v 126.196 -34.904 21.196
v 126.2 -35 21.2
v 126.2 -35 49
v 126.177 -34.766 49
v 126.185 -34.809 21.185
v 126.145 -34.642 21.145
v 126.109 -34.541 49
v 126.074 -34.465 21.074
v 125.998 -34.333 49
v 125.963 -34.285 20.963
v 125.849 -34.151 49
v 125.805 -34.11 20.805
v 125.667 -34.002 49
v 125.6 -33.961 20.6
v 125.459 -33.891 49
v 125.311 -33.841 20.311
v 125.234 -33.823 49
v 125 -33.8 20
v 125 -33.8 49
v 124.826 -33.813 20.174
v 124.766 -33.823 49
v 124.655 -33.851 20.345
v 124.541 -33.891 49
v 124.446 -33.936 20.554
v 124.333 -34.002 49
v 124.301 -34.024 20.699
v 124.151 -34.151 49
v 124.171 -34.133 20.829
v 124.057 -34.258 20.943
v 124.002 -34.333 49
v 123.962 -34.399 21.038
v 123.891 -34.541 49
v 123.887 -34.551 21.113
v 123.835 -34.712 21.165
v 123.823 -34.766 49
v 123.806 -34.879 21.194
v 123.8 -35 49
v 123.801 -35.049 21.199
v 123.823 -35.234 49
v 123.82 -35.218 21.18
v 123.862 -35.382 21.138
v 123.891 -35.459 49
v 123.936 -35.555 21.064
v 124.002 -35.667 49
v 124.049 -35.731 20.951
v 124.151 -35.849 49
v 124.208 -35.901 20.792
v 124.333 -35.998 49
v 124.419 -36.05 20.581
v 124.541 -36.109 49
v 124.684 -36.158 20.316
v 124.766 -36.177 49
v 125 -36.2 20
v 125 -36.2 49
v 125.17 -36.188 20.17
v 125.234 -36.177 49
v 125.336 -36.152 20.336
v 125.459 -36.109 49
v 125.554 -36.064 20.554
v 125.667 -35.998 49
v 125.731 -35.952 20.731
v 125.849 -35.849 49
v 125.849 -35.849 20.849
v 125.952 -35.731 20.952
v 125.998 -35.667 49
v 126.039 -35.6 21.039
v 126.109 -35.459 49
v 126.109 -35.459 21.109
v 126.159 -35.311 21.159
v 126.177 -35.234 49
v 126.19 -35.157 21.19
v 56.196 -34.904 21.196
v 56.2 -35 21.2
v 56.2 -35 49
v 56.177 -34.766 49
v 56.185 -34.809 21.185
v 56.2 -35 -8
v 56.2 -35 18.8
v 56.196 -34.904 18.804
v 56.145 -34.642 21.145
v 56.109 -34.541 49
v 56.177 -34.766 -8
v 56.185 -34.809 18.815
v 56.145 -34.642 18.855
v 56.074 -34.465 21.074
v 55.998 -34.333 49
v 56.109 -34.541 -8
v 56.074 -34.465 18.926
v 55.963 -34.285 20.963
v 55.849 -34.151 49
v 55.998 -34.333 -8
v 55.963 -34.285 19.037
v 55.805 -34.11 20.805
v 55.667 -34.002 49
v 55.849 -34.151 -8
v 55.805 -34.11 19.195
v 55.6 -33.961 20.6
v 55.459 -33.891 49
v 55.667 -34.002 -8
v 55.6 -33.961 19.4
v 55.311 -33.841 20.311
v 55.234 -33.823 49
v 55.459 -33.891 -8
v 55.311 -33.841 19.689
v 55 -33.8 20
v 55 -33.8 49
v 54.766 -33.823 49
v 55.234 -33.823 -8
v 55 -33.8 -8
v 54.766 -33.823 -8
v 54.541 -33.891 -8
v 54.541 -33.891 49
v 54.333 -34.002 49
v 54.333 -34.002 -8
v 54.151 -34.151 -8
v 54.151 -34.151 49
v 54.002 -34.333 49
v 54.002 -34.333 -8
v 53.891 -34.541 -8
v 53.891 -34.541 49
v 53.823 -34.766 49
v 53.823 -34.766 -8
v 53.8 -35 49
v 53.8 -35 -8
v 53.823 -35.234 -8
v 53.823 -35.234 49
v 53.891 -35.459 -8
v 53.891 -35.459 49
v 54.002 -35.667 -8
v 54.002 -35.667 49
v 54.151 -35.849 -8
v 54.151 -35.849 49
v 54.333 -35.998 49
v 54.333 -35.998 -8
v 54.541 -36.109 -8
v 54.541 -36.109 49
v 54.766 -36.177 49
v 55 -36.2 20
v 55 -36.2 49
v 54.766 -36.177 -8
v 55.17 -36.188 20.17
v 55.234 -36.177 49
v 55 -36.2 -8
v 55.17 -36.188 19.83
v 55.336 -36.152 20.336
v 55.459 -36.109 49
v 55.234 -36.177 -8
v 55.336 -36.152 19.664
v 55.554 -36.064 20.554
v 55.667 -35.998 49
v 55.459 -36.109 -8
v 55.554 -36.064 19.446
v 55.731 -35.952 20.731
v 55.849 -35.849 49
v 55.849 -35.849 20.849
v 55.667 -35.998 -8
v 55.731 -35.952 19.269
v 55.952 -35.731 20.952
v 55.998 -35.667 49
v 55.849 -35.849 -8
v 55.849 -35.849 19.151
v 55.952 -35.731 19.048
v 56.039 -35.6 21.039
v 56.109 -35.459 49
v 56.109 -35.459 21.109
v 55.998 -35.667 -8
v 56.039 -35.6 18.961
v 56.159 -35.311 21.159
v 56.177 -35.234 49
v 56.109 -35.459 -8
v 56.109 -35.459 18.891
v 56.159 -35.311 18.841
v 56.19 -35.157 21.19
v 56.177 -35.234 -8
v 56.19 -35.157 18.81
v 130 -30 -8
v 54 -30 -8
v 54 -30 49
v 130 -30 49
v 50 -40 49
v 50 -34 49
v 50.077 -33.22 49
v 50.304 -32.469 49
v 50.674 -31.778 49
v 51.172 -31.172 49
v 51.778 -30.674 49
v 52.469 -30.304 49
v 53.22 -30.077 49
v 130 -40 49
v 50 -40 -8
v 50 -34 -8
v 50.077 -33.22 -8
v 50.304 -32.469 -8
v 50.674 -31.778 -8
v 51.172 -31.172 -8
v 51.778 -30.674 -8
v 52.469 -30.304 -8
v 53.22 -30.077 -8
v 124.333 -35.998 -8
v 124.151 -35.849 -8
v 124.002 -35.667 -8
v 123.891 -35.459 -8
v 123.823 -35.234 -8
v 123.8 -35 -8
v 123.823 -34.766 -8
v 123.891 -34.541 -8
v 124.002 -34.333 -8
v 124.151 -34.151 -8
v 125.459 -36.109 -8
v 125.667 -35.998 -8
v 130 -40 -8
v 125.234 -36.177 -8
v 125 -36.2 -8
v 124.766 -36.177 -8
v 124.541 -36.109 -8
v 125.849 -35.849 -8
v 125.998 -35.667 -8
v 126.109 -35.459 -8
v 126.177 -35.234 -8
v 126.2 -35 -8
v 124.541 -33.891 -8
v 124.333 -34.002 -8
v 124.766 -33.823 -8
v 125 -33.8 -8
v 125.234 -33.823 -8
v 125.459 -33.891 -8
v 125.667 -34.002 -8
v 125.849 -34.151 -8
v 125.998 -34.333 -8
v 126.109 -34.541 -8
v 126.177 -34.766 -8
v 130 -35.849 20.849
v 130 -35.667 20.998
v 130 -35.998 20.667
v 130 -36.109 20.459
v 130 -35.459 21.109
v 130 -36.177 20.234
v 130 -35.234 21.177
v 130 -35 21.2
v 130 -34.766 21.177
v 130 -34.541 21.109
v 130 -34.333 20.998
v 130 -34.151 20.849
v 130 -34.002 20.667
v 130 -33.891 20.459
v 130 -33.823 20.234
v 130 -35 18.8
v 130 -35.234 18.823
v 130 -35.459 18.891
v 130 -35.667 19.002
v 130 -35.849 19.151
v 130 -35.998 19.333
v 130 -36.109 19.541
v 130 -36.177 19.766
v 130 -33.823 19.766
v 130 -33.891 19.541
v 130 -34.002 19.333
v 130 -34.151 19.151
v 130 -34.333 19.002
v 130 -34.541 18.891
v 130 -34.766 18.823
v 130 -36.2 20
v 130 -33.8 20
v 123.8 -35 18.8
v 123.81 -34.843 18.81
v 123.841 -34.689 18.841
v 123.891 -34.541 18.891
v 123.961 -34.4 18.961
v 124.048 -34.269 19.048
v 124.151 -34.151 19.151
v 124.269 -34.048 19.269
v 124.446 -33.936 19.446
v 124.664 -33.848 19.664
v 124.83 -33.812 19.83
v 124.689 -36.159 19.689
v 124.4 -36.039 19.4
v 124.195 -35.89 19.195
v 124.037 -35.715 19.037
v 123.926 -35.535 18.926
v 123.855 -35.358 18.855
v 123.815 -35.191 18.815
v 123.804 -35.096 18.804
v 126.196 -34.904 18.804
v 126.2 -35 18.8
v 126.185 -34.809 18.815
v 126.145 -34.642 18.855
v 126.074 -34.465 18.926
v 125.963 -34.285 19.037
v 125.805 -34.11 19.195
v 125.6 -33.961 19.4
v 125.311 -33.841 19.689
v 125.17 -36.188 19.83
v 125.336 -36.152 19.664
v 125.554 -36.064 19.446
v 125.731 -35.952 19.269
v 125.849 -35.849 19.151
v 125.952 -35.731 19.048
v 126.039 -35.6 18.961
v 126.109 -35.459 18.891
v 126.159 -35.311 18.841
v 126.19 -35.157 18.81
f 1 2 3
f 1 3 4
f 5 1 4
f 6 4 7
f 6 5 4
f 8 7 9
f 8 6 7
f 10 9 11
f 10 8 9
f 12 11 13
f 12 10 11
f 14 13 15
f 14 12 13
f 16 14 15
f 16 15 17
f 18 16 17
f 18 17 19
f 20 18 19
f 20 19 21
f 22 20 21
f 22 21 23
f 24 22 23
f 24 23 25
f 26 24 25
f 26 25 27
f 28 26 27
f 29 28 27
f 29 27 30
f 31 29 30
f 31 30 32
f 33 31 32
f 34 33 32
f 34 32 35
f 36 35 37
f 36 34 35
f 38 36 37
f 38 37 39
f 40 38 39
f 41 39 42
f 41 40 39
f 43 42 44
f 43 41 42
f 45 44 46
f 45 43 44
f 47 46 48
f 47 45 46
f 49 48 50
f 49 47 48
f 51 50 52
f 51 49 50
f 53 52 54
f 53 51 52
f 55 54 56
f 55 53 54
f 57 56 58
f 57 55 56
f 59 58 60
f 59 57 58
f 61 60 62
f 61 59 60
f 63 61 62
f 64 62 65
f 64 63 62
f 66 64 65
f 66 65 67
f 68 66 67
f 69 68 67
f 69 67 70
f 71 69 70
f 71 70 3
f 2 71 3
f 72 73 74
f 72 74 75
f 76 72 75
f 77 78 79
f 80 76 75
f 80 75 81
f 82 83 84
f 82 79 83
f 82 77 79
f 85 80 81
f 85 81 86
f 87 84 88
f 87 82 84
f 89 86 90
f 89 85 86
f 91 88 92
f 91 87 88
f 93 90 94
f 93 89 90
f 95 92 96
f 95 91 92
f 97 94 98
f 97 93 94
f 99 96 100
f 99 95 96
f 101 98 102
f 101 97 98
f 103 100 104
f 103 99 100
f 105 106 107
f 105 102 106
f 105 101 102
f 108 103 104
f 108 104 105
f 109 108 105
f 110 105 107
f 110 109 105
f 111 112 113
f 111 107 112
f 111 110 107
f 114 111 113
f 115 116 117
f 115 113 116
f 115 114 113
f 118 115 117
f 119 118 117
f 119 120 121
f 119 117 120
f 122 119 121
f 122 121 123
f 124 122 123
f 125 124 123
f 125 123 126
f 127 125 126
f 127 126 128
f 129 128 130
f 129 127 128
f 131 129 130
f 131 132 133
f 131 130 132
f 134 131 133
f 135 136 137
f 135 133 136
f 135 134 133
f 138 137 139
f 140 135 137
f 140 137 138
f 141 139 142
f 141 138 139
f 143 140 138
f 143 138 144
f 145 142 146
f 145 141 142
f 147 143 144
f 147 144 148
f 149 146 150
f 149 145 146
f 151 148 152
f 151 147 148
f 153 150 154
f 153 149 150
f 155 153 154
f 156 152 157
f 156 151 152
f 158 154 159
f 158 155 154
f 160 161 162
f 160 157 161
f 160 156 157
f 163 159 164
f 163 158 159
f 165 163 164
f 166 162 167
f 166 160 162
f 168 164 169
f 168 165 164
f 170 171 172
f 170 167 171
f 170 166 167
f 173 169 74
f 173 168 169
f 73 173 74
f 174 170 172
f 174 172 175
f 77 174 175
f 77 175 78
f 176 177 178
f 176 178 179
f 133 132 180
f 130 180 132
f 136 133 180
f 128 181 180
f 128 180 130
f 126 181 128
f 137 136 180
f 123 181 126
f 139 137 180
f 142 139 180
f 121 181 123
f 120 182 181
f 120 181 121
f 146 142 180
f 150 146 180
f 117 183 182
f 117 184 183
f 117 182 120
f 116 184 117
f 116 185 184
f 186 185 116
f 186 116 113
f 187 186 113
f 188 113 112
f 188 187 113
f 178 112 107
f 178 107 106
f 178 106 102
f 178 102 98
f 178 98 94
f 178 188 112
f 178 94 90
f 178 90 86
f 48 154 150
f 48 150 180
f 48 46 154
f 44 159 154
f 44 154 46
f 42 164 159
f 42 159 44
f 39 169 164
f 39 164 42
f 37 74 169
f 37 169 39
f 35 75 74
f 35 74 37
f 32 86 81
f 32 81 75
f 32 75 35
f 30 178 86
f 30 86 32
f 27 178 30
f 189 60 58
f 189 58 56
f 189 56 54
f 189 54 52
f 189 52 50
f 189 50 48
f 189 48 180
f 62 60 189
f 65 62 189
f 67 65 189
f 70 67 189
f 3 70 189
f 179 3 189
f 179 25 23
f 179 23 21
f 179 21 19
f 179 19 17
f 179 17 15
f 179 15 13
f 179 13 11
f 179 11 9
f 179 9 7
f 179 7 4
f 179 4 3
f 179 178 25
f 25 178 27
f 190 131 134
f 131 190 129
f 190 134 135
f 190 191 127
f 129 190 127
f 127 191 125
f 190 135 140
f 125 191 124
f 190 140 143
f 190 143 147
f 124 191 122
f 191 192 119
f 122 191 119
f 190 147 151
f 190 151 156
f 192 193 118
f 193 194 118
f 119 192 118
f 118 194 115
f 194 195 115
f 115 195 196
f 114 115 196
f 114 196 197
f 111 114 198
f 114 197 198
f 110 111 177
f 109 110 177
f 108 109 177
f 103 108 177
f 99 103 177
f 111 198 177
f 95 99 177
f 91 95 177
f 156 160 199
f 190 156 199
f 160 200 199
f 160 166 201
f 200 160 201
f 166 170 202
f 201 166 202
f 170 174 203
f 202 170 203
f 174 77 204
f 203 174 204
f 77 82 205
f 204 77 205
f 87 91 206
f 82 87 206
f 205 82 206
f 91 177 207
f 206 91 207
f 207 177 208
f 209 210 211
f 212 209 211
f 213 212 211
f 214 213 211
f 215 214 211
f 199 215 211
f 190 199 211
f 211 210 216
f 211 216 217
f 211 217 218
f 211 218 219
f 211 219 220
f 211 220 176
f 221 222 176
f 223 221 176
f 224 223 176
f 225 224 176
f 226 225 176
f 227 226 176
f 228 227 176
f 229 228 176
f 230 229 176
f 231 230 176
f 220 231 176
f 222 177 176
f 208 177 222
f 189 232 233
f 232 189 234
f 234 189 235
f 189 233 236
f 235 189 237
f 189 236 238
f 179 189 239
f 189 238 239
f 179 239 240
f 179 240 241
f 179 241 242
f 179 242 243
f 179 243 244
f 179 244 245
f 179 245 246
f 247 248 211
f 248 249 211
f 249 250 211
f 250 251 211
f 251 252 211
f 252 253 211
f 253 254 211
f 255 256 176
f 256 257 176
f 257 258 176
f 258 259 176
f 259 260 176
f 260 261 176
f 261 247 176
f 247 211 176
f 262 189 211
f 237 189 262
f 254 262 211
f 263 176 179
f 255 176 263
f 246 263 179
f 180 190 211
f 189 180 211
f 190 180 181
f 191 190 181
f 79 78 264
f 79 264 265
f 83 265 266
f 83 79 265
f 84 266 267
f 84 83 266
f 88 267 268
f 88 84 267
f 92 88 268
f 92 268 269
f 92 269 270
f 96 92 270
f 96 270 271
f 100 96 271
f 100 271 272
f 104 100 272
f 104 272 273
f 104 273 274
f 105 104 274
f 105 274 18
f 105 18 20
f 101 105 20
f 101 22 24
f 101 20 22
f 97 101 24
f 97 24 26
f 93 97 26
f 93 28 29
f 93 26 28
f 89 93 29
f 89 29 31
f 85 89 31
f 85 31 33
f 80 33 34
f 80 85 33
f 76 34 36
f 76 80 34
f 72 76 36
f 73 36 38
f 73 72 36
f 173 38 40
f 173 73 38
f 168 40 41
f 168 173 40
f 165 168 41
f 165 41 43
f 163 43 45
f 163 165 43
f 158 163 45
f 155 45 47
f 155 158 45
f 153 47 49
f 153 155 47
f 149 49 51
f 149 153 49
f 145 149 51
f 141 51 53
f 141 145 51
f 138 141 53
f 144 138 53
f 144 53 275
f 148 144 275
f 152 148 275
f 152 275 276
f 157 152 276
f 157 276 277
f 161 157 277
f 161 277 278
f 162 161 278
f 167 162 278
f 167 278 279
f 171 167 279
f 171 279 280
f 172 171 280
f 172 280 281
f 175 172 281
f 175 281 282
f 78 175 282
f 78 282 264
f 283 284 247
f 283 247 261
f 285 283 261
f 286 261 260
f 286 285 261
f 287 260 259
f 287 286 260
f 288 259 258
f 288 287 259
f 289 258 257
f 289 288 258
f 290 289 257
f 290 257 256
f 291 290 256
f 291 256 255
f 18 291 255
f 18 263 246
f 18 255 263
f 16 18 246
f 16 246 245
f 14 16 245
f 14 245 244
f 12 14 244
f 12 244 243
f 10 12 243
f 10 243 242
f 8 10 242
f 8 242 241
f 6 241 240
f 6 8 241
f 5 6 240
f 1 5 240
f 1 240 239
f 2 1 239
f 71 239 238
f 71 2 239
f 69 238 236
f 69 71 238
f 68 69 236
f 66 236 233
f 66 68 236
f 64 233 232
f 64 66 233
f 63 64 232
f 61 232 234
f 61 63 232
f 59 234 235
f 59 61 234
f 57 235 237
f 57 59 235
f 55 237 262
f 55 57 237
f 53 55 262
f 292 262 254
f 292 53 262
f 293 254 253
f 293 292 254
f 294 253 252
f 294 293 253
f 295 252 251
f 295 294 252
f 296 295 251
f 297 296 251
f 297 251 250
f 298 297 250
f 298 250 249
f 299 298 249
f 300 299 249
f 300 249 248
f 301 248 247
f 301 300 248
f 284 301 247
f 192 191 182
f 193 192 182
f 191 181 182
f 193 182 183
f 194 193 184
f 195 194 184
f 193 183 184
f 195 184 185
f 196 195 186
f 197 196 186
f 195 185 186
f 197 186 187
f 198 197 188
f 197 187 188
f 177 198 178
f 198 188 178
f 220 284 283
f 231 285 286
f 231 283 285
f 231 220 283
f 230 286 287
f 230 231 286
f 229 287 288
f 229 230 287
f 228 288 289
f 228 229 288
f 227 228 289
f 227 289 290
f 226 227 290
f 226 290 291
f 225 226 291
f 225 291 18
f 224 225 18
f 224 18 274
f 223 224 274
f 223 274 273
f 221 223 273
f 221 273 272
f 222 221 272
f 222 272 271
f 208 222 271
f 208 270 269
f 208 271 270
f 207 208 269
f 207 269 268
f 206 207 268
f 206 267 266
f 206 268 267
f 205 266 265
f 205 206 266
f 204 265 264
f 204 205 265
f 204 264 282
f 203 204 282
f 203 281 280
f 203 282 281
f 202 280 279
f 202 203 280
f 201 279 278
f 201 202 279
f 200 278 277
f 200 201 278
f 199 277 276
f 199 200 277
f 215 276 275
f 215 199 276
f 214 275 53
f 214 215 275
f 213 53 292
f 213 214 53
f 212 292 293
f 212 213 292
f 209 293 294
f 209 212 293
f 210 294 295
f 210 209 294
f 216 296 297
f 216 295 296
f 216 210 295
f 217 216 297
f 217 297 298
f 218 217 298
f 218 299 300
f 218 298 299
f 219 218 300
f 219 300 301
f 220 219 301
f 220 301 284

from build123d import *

# Parameters (mm, degrees)
CYLINDER107_R     = 1.2
CYLINDER107_DEPTH = 100
CYLINDER110_R     = 1.2
CYLINDER110_DEPTH = 100
CYLINDER108_R     = 1.2
CYLINDER108_DEPTH = 100
BOX038_W          = 80
BOX038_H          = 10
BOX038_DEPTH      = 57
FILLET015_R       = 4


with BuildPart() as screwhole055:
    # Cylinder107 → Cylinder107 (new body)
    with BuildSketch(Plane(origin=(125, -35, -20), x_dir=(1, 0, 0), z_dir=(0, 0, 1))):
        Circle(CYLINDER107_R)
    extrude(amount=CYLINDER107_DEPTH)


with BuildPart() as screwhole058:
    # Cylinder110 → Cylinder110 (new body)
    with BuildSketch(Plane(origin=(55, -35, 20), x_dir=(0, 0, -1), z_dir=(1, 0, 0))):
        Circle(CYLINDER110_R)
    extrude(amount=CYLINDER110_DEPTH)


with BuildPart() as fusion001002012030037:
    # Cylinder108 → Cylinder108 (new body)
    with BuildSketch(Plane(origin=(55, -35, -20), x_dir=(1, 0, 0), z_dir=(0, 0, 1))):
        Circle(CYLINDER108_R)
    extrude(amount=CYLINDER108_DEPTH)

    # Fusion001002012030037: union ScrewHole055, ScrewHole058
    add(screwhole055.part)
    add(screwhole058.part)


with BuildPart() as side001:
    # Box038 → Box038 (new body)
    with BuildSketch(Plane(origin=(50, -40, -8), x_dir=(1, 0, 0), z_dir=(0, 0, 1))):
        with Locations((40, 5)):
            Rectangle(BOX038_W, BOX038_H)
    extrude(amount=BOX038_DEPTH)

    # Fillet015
    fillet015_edges = [side001.edges().sort_by_distance(p)[0] for p in [
        (50, -30, 20.5),
    ]]
    fillet(fillet015_edges, radius=FILLET015_R)

    # Cut015017007031: cut Fusion001002012030037
    add(fusion001002012030037.part, mode=Mode.SUBTRACT)


solid = side001.part
